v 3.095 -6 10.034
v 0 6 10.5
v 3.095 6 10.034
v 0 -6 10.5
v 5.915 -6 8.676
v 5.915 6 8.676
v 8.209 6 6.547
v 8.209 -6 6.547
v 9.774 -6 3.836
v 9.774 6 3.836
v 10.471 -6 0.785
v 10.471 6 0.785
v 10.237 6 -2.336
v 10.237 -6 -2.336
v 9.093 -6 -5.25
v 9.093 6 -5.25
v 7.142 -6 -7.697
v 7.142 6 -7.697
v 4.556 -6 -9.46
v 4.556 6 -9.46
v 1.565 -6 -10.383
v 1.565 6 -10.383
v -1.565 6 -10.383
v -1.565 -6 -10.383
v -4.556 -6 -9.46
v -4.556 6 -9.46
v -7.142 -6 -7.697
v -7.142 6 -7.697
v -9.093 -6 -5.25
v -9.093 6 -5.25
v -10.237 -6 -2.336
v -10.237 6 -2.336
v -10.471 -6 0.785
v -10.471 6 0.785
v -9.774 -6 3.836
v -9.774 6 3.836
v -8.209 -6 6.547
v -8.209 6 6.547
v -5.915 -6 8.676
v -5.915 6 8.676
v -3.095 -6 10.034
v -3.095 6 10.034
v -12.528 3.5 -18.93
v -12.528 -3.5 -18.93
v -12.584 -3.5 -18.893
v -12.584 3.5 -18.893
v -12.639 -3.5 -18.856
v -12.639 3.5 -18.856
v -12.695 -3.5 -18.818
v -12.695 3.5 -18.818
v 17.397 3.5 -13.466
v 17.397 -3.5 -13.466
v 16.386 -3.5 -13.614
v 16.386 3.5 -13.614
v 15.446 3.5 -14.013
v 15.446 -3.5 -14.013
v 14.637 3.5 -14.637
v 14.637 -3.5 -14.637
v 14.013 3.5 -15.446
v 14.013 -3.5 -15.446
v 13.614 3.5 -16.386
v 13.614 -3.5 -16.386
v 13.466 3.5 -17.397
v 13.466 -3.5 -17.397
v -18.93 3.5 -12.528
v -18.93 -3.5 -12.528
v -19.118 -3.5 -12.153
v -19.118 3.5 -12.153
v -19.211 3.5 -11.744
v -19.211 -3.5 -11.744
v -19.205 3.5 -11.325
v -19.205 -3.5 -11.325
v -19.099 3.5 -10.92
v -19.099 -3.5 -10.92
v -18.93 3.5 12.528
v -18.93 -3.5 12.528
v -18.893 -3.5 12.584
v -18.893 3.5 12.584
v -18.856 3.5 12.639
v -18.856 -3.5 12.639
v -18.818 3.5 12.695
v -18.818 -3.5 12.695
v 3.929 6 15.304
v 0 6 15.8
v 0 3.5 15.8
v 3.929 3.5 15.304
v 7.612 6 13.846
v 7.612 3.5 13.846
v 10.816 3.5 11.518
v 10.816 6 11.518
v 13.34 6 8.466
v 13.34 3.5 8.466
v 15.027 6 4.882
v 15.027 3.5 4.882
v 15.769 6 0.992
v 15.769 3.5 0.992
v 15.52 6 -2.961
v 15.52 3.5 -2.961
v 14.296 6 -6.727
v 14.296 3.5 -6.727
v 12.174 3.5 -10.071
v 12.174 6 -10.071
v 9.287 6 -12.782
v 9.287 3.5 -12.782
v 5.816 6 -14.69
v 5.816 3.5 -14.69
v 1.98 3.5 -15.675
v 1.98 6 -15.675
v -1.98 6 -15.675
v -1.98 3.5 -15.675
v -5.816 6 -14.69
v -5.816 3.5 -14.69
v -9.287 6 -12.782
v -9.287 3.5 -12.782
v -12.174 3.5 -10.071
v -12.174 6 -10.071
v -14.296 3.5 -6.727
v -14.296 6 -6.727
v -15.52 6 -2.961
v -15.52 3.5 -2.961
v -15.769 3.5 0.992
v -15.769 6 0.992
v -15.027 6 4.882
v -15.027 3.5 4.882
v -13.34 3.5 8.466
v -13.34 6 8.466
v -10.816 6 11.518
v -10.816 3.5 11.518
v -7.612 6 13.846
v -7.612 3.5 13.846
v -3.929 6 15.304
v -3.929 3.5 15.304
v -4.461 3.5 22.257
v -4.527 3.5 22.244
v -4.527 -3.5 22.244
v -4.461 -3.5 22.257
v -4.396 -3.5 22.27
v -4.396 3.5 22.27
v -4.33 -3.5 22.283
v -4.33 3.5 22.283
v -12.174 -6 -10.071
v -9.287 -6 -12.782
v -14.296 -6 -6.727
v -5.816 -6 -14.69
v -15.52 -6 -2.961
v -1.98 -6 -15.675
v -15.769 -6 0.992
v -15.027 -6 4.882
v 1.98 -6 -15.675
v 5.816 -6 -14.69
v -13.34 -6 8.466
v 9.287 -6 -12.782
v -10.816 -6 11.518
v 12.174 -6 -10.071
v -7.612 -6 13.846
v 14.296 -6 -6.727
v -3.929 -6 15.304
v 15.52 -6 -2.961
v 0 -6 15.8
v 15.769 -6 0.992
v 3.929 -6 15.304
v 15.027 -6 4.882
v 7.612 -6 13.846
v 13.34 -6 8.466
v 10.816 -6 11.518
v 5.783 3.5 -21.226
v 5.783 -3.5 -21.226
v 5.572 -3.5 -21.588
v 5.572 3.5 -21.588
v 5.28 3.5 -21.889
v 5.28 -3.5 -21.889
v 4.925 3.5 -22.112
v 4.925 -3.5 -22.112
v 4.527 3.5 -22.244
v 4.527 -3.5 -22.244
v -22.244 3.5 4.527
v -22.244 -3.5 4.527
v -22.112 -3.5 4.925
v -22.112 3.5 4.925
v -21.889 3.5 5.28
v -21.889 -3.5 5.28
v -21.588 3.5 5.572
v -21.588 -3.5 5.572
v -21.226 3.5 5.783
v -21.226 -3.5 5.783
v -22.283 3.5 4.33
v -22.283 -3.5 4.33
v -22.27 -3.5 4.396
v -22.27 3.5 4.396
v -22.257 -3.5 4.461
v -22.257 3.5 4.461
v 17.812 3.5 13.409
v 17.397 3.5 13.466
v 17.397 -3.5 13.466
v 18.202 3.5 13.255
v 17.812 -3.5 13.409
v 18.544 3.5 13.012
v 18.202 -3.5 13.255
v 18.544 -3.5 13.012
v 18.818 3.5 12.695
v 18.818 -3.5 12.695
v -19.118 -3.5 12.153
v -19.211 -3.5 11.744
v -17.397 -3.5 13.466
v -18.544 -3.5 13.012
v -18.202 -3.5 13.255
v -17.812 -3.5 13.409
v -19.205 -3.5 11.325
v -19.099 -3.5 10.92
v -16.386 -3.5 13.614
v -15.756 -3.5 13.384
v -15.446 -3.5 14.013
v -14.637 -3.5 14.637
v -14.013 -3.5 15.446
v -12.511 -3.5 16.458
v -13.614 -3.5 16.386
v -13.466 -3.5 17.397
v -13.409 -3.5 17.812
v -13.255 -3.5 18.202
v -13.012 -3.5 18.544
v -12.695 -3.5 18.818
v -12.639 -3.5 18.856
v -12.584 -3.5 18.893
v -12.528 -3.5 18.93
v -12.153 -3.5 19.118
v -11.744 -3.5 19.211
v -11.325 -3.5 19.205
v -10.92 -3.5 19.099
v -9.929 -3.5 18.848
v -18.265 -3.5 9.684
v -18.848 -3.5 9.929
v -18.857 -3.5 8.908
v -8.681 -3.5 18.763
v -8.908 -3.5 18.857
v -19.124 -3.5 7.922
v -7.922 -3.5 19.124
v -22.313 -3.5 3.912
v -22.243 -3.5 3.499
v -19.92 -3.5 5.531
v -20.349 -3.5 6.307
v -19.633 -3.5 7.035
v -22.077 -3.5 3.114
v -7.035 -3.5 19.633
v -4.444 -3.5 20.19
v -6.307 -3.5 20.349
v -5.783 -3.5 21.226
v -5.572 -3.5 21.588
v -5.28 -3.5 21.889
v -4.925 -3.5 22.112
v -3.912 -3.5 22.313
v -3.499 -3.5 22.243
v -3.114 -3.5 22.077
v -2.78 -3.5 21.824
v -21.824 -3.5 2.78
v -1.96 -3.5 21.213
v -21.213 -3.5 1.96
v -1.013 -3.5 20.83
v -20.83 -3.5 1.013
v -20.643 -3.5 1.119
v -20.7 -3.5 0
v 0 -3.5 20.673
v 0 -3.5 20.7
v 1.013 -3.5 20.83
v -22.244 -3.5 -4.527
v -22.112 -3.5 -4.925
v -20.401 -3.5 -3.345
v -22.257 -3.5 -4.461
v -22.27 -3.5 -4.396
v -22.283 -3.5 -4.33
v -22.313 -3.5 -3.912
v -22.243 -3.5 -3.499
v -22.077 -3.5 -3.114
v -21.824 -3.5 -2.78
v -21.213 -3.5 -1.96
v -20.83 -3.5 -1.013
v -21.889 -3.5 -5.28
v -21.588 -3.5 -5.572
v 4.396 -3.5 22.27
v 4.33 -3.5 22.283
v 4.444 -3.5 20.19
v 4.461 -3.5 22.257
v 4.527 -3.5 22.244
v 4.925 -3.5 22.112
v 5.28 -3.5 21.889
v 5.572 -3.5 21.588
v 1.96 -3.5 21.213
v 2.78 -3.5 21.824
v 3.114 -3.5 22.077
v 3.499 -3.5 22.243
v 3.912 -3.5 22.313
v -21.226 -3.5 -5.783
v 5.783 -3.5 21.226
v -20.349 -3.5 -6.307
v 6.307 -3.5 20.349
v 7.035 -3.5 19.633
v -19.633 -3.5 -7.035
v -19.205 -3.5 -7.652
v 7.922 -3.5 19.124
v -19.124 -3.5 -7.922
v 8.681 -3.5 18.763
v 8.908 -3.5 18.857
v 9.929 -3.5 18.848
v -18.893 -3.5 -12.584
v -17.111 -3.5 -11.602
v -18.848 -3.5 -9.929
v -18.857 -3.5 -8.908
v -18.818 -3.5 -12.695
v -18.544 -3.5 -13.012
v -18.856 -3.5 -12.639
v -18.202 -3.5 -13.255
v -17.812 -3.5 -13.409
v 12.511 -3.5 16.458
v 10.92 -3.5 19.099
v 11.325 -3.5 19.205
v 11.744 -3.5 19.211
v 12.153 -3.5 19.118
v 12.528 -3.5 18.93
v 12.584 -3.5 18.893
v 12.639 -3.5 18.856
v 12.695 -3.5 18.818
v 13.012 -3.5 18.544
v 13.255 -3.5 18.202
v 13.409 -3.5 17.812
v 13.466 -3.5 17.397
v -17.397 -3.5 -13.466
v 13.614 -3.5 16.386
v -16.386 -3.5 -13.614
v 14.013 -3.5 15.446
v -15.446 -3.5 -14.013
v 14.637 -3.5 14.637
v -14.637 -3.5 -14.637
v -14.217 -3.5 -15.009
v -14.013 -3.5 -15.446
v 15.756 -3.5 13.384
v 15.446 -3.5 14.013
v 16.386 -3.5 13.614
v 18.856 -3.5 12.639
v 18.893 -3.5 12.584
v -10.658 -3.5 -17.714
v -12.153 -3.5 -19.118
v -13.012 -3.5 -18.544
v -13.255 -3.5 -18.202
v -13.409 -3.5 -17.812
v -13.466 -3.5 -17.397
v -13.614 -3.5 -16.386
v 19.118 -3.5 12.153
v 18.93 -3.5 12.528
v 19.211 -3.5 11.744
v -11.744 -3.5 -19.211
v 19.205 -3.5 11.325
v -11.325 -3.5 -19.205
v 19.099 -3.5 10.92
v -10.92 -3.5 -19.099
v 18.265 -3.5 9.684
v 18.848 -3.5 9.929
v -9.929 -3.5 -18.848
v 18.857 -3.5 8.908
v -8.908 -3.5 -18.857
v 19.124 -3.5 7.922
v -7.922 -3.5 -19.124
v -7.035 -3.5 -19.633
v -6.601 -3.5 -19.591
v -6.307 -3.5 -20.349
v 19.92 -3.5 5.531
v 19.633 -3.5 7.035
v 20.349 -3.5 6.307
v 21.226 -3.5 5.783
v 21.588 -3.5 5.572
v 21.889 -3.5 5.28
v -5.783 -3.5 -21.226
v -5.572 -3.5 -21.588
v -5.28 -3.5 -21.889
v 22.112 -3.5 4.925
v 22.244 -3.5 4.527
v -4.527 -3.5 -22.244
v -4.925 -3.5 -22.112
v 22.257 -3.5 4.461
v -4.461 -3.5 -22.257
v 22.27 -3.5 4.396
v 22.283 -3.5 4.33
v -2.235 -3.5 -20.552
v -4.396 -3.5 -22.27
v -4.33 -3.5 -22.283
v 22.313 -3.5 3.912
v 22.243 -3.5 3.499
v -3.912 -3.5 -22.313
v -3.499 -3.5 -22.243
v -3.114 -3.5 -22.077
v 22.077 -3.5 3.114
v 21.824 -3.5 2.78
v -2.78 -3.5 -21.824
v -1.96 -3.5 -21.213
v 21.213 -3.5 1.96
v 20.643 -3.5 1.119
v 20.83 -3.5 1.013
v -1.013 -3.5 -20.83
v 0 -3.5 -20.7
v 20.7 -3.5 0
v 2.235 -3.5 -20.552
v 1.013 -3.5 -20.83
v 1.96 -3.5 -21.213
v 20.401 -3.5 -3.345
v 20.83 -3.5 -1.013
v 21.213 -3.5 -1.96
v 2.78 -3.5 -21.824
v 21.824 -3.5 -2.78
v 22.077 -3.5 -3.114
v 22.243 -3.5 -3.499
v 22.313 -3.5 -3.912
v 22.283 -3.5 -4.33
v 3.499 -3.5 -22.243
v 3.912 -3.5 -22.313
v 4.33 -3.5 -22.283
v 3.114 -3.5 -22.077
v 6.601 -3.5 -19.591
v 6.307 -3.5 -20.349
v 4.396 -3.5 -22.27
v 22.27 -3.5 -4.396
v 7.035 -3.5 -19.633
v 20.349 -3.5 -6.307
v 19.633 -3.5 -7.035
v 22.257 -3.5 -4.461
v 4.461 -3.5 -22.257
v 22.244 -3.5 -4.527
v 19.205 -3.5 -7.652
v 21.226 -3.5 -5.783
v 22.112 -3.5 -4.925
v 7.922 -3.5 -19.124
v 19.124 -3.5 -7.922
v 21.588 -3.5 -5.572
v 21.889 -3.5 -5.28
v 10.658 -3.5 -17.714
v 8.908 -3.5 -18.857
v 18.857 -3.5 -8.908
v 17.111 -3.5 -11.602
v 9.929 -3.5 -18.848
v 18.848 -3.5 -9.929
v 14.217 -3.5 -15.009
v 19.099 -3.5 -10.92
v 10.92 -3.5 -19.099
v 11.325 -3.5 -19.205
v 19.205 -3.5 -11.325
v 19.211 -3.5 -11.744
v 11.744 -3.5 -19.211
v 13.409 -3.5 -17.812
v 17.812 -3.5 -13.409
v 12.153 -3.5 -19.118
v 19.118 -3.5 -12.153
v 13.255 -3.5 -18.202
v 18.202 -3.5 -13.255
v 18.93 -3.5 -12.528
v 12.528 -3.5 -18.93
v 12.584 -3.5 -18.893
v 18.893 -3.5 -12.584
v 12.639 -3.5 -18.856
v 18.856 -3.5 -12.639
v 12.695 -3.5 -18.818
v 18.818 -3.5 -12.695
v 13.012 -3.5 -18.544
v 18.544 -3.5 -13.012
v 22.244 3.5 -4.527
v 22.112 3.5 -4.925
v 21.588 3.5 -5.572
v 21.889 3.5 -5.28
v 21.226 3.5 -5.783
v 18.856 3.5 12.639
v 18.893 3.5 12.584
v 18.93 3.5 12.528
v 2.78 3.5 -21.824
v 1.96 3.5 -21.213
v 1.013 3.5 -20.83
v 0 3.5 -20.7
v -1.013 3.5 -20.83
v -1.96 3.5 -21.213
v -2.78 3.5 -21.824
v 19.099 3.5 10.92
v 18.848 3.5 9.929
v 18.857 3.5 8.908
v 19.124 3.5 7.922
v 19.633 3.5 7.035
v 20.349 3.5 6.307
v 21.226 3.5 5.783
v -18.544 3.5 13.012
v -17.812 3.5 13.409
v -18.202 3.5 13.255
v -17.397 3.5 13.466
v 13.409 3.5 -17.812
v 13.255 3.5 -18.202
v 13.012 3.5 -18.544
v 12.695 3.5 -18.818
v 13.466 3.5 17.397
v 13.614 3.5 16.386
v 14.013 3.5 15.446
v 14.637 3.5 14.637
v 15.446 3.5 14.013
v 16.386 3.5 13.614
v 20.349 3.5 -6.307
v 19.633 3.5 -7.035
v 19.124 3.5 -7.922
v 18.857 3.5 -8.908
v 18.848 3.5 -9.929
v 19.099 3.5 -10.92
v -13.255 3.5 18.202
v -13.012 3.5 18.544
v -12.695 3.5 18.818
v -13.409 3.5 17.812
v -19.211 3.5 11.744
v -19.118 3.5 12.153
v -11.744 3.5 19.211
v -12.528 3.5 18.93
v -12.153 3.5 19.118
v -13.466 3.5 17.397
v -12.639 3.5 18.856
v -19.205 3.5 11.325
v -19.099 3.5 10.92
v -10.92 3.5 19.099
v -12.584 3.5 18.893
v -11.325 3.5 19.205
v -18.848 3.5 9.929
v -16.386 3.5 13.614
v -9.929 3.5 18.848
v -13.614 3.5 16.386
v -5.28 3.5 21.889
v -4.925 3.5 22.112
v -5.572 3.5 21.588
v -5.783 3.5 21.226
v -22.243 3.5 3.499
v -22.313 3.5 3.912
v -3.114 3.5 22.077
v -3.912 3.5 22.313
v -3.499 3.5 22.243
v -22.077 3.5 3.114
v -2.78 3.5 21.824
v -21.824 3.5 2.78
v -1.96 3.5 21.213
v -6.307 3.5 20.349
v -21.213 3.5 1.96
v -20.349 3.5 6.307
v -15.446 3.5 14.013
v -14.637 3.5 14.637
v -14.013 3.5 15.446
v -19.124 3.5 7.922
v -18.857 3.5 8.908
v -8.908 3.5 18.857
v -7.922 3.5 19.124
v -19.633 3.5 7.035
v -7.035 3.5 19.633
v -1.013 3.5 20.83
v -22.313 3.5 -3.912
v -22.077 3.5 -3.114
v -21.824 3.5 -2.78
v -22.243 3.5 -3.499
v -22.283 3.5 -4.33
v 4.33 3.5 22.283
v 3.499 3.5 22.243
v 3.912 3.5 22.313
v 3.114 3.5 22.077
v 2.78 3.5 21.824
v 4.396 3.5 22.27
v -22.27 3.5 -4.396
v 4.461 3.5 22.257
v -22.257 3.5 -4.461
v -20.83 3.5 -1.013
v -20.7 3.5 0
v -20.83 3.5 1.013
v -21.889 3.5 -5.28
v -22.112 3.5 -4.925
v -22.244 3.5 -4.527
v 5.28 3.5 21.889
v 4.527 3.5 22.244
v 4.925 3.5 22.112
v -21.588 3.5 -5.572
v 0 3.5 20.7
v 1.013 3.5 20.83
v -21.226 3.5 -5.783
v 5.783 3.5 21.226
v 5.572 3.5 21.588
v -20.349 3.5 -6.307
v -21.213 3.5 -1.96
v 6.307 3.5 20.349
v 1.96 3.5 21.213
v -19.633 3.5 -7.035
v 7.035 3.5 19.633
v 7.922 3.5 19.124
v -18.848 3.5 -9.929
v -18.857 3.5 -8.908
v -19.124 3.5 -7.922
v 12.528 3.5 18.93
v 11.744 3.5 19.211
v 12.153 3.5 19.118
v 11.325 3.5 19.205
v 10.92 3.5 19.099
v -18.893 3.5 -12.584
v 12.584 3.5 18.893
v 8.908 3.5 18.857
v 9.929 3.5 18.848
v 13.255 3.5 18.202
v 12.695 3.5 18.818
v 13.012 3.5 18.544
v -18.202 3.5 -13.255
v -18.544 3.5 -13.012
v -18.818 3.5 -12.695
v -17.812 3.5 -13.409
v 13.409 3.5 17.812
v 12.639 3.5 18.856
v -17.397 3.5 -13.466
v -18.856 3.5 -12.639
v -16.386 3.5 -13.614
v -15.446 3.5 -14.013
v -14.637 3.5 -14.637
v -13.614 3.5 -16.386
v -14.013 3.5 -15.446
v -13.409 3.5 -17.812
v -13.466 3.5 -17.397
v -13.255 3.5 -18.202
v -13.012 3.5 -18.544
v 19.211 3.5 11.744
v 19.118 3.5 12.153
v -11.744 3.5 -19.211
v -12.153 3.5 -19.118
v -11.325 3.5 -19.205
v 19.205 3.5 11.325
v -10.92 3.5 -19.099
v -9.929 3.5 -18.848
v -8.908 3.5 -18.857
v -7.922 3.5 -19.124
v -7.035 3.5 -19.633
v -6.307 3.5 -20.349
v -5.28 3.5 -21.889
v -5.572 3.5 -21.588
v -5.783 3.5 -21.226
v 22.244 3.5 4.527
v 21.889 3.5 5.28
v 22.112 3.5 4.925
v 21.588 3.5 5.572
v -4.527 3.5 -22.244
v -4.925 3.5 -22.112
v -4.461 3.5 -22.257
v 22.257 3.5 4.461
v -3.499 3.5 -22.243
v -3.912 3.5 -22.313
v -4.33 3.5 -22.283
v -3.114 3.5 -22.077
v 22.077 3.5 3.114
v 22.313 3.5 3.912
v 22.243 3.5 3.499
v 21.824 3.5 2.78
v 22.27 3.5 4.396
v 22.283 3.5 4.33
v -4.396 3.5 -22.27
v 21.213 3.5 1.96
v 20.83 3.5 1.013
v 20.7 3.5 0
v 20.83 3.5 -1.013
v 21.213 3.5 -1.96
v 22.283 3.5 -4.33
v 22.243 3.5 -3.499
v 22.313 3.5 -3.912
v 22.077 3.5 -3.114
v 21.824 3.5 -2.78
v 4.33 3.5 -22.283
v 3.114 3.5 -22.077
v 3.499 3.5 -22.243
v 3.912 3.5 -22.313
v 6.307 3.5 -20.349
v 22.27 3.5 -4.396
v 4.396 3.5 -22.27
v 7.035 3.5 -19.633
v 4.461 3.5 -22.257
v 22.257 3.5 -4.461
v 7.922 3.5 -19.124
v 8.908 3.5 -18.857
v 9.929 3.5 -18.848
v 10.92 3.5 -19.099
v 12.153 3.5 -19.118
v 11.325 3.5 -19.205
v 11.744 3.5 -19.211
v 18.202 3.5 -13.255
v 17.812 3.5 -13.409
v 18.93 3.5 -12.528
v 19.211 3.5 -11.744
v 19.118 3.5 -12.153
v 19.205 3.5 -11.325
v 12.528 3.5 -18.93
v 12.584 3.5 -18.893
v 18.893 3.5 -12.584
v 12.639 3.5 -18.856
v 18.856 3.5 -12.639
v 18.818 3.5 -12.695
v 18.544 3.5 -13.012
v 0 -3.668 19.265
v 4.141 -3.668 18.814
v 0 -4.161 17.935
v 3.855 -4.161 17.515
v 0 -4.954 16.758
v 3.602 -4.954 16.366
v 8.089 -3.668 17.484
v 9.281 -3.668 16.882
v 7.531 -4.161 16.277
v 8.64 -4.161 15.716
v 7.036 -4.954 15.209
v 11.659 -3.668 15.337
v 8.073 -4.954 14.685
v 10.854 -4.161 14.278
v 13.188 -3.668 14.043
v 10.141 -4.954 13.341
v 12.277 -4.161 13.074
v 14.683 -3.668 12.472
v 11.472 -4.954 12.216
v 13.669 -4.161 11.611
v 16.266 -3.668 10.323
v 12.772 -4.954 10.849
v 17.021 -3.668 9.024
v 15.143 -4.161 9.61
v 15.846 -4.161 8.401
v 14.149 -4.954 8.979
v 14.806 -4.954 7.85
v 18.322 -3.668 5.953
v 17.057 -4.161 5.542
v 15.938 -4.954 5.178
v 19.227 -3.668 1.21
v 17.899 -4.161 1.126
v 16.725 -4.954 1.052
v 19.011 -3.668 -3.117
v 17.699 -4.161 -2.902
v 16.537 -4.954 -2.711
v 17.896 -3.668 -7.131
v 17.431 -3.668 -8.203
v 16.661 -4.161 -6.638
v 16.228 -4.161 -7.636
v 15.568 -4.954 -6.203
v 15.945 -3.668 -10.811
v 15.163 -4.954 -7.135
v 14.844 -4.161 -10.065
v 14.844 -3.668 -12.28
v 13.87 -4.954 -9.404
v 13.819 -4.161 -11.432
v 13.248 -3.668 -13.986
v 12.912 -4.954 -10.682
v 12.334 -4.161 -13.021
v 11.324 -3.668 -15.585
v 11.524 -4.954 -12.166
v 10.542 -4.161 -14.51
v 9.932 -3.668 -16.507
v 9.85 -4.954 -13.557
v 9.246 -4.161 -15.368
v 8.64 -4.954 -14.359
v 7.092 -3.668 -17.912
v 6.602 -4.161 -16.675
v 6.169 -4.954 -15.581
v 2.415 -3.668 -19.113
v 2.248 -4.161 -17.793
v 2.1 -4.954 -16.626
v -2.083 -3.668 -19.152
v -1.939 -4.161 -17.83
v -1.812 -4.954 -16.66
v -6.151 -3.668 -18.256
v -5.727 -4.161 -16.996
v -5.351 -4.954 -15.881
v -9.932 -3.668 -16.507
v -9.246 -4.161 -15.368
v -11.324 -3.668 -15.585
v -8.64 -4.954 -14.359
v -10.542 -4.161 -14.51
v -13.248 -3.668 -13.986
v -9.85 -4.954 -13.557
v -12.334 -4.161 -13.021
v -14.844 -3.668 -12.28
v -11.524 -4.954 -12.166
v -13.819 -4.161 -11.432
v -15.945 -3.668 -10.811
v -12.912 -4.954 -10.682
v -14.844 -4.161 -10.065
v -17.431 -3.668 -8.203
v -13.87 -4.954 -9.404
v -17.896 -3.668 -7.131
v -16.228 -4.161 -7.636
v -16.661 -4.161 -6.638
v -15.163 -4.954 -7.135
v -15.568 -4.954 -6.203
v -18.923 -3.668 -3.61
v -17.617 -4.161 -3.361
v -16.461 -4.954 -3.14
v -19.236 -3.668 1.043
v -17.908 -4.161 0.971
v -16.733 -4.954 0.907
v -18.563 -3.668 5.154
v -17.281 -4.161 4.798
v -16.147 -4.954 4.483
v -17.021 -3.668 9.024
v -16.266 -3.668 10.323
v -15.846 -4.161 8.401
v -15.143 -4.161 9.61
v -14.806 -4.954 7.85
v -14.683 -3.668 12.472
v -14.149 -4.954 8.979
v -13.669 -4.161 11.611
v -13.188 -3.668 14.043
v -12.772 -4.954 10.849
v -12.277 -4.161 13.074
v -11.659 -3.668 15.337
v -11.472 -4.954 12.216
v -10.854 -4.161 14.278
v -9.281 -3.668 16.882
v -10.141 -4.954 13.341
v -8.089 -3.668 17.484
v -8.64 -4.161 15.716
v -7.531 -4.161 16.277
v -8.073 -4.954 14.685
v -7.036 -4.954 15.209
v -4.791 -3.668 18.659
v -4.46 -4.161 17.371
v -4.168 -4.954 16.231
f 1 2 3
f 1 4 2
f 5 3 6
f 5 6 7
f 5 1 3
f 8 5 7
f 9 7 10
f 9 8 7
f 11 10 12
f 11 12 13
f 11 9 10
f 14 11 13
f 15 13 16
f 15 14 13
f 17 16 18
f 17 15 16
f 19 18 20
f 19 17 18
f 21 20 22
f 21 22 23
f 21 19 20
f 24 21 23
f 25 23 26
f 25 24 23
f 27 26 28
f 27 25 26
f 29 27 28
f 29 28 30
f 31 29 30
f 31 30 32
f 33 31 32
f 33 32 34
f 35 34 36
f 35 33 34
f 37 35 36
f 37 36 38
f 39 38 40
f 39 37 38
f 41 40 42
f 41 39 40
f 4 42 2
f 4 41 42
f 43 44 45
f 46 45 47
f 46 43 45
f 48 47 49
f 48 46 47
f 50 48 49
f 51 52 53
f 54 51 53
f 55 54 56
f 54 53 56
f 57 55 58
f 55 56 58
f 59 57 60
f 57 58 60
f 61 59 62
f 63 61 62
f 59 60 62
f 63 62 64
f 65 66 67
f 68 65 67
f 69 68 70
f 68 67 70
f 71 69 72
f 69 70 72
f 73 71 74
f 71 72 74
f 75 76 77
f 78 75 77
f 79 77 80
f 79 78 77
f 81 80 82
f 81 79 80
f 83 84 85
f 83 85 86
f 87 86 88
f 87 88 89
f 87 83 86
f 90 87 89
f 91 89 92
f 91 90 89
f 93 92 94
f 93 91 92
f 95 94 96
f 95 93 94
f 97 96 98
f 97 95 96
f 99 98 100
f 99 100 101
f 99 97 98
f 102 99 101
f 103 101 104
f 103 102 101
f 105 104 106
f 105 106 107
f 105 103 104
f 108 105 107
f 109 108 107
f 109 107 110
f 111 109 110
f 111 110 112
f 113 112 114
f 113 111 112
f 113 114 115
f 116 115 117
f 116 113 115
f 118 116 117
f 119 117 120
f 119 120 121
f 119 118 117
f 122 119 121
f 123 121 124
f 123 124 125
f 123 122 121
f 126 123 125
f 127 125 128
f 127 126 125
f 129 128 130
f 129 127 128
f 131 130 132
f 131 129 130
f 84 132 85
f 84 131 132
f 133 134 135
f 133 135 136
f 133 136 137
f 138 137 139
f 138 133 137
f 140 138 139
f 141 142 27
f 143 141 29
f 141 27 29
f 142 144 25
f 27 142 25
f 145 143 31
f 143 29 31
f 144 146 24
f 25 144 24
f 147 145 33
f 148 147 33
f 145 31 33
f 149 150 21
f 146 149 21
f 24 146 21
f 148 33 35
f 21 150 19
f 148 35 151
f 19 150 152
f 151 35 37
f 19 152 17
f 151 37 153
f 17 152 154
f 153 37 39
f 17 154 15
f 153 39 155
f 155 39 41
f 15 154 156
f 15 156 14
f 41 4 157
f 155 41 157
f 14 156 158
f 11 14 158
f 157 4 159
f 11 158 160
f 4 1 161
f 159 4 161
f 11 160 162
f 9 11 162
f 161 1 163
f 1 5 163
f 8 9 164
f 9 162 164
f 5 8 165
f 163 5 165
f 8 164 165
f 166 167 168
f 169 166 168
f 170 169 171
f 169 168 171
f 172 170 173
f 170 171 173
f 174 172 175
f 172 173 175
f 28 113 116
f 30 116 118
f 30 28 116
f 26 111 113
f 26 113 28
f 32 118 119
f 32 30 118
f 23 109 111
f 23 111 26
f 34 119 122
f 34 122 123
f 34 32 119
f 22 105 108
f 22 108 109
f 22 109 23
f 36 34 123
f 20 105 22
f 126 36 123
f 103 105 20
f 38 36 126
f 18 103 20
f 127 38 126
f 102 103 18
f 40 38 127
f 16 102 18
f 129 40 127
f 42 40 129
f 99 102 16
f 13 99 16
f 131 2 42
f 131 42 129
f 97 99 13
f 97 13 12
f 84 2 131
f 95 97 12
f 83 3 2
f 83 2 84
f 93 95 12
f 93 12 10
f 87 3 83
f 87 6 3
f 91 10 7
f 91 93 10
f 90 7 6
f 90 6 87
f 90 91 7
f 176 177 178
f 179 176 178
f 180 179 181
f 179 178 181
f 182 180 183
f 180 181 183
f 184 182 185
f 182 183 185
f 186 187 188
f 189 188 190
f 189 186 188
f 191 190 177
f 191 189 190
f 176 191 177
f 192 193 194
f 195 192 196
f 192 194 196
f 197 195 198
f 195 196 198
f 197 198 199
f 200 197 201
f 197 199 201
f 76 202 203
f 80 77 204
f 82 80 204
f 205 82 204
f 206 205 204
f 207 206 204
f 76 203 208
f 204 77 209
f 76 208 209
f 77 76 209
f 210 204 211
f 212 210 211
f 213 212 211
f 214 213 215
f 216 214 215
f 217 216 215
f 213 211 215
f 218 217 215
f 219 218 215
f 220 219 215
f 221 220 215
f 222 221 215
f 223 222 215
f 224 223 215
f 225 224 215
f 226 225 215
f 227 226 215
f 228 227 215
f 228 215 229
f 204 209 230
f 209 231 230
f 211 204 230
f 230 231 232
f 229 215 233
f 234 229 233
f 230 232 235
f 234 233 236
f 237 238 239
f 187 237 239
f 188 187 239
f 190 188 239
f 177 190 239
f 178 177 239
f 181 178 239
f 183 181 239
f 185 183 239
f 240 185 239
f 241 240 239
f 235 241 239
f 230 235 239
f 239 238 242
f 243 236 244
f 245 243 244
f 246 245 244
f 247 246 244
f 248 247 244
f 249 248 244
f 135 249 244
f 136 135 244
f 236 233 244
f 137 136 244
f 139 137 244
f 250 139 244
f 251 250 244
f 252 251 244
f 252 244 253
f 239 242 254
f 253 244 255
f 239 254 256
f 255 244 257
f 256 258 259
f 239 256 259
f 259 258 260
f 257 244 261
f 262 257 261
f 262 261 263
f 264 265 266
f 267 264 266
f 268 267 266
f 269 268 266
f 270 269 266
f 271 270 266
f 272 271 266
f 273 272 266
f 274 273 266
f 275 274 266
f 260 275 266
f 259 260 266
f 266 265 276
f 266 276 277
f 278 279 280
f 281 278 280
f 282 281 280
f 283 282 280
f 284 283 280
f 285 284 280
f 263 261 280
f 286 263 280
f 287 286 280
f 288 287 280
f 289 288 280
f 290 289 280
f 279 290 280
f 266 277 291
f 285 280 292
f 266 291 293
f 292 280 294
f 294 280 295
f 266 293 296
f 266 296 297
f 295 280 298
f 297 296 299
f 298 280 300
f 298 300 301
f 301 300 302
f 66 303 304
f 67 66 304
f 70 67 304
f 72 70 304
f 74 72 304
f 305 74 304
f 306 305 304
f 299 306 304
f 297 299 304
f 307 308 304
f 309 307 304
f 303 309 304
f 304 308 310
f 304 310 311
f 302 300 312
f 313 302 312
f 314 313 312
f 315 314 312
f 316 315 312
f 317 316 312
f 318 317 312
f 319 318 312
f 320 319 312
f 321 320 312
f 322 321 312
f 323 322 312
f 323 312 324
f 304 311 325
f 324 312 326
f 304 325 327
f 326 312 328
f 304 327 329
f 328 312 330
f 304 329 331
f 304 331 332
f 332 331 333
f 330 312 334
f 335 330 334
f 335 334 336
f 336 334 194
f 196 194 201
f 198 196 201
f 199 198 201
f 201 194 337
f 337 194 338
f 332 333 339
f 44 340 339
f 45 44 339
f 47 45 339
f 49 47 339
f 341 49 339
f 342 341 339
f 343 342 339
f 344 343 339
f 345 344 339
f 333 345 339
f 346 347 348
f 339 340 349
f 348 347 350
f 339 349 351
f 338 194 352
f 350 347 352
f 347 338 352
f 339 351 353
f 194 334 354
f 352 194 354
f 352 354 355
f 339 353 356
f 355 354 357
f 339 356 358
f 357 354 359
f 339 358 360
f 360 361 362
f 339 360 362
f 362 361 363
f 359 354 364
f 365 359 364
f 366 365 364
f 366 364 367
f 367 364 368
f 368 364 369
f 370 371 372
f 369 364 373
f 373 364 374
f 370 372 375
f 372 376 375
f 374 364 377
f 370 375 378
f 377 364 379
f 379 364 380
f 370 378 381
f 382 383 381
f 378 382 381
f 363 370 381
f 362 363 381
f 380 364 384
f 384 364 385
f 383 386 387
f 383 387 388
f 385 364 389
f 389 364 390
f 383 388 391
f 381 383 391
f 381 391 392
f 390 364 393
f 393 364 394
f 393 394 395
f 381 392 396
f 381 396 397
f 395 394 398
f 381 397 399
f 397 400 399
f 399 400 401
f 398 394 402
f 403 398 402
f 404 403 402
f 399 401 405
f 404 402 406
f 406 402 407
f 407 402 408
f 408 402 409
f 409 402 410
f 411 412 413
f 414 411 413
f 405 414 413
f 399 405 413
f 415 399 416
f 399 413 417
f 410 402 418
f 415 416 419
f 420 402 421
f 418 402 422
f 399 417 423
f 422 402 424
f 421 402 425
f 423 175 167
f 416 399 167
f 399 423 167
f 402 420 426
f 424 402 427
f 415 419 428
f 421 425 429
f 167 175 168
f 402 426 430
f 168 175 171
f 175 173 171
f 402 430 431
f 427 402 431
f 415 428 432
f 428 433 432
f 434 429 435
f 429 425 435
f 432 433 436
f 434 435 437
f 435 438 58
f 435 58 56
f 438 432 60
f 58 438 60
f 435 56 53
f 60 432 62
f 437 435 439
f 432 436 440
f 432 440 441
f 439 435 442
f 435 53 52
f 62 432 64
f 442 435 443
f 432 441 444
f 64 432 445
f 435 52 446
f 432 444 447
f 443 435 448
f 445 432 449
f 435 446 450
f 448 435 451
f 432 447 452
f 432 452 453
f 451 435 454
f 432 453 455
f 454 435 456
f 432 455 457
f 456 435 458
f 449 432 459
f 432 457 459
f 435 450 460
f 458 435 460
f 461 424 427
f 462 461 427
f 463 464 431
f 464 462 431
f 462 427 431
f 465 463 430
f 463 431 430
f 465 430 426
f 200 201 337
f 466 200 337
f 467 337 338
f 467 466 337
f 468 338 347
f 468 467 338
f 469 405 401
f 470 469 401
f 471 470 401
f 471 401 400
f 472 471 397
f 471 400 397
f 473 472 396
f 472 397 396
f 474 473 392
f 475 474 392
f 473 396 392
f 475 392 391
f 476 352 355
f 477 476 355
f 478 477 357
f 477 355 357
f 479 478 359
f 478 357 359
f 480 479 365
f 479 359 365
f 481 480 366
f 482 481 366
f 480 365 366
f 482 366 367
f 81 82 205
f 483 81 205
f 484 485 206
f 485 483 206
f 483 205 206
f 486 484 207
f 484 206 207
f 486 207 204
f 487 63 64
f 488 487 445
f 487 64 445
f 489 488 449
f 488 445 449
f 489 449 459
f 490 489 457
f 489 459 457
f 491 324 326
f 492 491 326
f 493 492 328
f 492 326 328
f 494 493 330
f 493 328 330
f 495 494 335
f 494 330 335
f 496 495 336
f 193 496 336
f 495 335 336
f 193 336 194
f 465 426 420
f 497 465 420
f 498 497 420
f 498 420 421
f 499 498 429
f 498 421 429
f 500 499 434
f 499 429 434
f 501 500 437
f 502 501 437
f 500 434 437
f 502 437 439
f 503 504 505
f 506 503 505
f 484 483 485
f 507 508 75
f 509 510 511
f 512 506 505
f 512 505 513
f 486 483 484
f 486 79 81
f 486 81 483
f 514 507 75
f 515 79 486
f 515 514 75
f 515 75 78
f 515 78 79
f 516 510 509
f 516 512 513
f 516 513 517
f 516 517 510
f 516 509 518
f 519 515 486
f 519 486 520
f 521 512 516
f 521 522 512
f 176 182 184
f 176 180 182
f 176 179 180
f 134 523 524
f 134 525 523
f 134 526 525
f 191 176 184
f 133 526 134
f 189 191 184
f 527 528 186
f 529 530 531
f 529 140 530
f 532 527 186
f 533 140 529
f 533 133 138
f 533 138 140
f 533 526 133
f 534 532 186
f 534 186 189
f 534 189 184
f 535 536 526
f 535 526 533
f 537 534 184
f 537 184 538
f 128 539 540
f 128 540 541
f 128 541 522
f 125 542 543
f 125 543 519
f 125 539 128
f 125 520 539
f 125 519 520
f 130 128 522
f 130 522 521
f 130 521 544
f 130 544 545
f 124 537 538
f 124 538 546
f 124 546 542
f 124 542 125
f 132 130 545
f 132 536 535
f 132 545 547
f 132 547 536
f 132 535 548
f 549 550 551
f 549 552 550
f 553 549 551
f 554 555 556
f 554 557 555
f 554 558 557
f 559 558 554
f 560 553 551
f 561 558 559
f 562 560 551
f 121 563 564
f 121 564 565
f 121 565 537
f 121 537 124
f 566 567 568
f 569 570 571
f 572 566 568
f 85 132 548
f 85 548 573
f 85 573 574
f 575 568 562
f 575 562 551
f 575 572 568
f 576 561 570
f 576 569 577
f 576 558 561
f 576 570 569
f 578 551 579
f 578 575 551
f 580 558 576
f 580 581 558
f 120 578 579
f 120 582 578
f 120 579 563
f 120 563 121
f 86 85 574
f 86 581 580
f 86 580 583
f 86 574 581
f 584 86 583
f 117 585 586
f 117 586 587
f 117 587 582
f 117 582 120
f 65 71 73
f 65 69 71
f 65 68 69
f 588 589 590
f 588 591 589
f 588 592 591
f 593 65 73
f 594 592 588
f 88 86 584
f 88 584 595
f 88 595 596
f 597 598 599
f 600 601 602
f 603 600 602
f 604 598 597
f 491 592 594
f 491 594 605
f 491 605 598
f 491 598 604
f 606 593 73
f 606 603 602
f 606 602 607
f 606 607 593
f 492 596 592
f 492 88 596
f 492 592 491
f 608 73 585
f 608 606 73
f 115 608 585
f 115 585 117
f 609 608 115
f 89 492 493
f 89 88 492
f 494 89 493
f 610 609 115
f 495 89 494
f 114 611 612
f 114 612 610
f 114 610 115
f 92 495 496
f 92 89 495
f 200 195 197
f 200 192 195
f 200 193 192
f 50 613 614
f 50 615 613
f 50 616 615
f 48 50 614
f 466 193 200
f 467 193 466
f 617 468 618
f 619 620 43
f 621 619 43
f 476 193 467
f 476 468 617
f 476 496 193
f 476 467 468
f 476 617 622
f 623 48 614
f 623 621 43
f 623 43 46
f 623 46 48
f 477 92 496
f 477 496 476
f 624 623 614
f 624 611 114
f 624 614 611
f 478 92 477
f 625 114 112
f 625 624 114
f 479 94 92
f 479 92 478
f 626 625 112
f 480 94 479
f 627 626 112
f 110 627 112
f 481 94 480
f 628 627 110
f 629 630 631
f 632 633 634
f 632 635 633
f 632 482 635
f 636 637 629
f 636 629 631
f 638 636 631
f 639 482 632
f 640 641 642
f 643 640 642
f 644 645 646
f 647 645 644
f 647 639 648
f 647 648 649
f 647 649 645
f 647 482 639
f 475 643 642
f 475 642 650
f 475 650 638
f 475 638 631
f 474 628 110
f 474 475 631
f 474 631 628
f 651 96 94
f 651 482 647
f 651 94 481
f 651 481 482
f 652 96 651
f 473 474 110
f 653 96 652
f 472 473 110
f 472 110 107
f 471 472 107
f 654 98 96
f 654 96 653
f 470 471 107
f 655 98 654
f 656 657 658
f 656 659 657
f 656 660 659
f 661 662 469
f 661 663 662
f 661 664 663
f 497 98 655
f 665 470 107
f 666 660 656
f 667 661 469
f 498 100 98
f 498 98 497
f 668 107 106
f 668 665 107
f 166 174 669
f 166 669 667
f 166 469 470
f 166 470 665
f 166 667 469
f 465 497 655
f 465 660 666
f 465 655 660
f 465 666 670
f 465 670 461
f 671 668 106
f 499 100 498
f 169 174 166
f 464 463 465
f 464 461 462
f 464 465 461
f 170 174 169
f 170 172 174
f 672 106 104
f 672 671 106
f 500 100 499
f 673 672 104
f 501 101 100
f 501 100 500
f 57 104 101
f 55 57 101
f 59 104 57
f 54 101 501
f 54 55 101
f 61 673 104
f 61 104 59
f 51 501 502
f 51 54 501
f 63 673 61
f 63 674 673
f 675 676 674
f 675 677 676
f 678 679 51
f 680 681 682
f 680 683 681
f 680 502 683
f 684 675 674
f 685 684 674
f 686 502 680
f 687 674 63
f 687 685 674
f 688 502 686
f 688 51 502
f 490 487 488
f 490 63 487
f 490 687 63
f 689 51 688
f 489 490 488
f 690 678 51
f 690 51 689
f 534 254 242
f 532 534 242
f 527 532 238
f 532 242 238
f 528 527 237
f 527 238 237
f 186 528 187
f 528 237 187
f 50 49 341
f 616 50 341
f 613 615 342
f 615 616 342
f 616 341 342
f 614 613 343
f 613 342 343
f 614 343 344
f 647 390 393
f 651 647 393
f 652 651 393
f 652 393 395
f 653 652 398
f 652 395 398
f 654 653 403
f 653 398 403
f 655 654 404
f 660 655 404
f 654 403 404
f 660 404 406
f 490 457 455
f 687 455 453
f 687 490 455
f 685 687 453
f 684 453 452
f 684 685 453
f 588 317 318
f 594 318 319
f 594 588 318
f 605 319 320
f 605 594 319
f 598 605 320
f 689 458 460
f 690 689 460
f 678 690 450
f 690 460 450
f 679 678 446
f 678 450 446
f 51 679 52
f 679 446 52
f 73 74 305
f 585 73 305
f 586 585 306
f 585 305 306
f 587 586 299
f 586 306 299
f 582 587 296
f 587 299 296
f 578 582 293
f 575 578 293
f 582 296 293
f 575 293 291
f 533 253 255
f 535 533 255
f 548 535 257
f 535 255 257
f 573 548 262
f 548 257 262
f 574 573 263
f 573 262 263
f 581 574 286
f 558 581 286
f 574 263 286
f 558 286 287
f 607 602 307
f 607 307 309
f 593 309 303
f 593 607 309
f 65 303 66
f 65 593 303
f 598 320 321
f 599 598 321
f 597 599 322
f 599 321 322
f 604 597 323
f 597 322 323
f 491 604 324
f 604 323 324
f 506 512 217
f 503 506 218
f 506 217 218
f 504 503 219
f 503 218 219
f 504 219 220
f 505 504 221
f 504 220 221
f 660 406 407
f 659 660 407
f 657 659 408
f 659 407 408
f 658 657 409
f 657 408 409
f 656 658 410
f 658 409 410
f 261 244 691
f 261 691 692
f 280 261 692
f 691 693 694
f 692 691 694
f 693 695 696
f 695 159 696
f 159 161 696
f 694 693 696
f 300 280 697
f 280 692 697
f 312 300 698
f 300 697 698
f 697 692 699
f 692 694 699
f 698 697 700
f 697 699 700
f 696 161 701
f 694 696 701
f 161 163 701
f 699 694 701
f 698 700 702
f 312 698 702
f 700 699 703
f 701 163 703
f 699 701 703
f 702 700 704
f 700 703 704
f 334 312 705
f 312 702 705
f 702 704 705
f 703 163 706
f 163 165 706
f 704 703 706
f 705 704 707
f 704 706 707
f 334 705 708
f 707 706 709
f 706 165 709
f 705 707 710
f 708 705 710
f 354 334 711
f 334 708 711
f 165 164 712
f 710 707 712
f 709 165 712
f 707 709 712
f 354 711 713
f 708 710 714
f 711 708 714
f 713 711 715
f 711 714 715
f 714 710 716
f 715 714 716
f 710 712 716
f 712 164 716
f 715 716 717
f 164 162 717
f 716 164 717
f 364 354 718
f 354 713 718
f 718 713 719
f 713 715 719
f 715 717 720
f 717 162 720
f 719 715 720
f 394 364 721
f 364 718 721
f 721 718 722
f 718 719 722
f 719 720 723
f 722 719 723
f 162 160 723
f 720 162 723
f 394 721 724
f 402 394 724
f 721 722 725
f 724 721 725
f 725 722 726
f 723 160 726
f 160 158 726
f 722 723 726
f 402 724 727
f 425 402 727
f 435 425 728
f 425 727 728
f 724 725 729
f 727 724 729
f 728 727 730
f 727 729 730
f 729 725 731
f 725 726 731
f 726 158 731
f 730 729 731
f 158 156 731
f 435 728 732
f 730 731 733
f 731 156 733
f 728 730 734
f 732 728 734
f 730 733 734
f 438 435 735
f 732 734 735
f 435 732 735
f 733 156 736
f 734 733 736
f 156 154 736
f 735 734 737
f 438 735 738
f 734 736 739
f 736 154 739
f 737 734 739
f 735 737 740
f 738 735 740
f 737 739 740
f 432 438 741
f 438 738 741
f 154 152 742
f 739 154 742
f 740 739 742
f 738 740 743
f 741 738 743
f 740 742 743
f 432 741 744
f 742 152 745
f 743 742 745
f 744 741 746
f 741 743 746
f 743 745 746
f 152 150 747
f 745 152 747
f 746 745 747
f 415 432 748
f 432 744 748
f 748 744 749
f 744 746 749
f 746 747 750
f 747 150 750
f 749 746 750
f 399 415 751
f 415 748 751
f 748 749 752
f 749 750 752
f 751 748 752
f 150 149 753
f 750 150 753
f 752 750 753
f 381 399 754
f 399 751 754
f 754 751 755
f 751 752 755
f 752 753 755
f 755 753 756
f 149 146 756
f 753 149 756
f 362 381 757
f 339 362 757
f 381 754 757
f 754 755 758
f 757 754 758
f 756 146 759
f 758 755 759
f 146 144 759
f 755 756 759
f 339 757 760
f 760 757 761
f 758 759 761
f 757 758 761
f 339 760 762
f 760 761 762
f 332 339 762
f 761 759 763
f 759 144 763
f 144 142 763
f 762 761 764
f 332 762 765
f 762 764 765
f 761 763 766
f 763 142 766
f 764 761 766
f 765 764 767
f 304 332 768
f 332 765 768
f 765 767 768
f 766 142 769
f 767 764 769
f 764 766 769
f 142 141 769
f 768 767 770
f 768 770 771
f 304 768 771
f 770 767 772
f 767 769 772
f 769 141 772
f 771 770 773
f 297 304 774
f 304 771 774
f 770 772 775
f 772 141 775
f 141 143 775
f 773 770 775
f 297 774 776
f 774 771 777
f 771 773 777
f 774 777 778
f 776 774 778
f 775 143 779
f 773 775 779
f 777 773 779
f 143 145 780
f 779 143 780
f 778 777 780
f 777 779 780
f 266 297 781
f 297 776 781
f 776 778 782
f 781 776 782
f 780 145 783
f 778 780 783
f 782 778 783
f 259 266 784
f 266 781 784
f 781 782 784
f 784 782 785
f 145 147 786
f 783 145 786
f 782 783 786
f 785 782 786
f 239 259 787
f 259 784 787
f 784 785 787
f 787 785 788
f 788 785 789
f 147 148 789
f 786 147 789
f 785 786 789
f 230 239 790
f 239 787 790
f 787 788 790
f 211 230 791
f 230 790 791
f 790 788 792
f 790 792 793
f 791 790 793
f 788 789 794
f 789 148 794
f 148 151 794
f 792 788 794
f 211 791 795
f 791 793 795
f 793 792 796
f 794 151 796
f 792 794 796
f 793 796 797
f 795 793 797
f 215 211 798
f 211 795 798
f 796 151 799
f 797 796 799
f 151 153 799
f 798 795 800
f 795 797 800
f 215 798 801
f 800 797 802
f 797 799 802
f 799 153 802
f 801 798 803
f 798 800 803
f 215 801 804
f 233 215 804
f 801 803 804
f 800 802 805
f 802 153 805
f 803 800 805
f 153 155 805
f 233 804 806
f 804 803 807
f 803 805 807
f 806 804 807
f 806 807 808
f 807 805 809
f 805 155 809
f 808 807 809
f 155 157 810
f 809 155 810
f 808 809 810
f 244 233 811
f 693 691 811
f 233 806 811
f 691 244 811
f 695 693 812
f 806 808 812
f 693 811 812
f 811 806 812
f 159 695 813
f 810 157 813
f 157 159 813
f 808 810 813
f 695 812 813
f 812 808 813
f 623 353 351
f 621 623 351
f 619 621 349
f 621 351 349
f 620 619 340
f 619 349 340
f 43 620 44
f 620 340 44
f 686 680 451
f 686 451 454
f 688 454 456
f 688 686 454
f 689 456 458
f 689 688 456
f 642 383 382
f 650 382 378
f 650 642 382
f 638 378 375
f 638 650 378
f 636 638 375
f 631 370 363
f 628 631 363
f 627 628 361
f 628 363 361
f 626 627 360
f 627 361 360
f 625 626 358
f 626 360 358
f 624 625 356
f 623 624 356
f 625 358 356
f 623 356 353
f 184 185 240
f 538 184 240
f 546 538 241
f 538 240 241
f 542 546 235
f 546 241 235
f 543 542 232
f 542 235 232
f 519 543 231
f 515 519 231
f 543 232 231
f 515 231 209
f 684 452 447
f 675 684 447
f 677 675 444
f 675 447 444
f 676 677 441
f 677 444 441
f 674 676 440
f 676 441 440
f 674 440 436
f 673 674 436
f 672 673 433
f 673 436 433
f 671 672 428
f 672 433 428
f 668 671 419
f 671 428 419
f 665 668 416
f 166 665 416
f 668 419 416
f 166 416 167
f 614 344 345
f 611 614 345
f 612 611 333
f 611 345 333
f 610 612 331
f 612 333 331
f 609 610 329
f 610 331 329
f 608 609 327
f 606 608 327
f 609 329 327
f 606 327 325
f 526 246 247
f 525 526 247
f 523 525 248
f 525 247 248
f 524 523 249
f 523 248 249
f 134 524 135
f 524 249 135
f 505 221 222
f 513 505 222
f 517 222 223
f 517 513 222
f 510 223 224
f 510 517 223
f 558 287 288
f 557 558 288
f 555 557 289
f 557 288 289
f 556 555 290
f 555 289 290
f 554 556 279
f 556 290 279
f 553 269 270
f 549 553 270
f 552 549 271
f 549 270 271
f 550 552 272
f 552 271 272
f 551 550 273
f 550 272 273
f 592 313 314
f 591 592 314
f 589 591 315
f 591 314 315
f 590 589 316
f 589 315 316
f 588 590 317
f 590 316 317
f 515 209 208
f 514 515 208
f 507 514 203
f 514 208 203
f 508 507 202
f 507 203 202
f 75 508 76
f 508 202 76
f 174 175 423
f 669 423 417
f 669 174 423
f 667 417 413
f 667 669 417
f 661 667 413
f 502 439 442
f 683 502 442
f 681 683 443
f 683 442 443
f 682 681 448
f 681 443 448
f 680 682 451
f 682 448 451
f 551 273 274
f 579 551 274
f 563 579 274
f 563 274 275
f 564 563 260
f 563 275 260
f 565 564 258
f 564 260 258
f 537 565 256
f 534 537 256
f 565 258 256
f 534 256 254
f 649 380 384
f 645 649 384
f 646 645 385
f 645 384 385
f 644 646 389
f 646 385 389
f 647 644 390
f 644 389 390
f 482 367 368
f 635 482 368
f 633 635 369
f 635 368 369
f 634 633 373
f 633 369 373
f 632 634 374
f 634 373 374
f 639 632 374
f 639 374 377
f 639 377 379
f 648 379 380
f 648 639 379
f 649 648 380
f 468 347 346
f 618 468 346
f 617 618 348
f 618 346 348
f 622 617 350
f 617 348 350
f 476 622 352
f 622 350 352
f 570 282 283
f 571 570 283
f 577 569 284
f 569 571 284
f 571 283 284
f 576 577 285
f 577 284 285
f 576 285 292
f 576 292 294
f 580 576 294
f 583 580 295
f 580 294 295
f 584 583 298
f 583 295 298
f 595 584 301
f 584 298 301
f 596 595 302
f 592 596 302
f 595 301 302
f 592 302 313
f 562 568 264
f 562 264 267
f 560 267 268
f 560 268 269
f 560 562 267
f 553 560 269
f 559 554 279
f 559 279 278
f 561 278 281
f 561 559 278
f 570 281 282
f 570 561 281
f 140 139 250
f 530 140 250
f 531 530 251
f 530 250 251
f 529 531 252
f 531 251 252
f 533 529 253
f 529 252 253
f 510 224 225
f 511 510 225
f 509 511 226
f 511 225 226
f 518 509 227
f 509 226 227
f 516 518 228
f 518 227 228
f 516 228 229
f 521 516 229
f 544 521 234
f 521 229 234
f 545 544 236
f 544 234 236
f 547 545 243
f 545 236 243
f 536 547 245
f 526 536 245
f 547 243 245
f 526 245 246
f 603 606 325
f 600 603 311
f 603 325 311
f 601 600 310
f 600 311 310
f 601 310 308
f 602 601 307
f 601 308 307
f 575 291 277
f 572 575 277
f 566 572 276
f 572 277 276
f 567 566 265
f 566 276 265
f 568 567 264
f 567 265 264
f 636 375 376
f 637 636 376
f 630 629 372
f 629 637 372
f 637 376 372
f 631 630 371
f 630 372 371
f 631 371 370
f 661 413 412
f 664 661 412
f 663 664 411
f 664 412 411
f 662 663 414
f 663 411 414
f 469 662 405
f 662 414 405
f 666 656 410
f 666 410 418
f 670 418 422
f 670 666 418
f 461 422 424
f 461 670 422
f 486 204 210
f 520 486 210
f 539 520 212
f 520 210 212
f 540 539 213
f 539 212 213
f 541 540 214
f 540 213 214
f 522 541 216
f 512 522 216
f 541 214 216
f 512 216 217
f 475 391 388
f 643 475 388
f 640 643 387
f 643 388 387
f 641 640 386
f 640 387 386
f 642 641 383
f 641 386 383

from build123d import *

# Parameters (mm, degrees)
SKETCH1_R           = 22.7
SKETCH1_R_2         = 10.5
BOSS_EXTRUDE1_DEPTH = 6
SKETCH2_OUTSIDE_W   = 60.464
SKETCH2_OUTSIDE_H   = 60.464
SKETCH2_OUTSIDE_R   = 15.8
CUT_EXTRUDE1_DEPTH  = 2.5
FILLET1_R           = 6
CUT_EXTRUDE2_DEPTH  = 34.478799262
CIRPATTERN1_COUNT   = 16


with BuildPart() as part:
    # Sketch1 → Boss-Extrude1 (new, symmetric)
    with BuildSketch(Plane(origin=(0, 0, 0), x_dir=(1, 0, 0), z_dir=(0, 1, 0))):
        with Locations(Location((0, 0, 0), (0, 0, 270))):
            Circle(SKETCH1_R)
        with Locations(Location((0, 0, 0), (0, 0, 270))):
            Circle(SKETCH1_R_2, mode=Mode.SUBTRACT)
    extrude(amount=BOSS_EXTRUDE1_DEPTH, both=True)

    # Sketch2 outside → Cut-Extrude1 (cut)
    with BuildSketch(Plane(origin=(0, 6, 0), x_dir=(1, 0, 0), z_dir=(0, 1, 0))):
        Rectangle(SKETCH2_OUTSIDE_W, SKETCH2_OUTSIDE_H)
        with Locations(Location((0, 0, 0), (0, 0, 270))):
            Circle(SKETCH2_OUTSIDE_R, mode=Mode.SUBTRACT)
    cut_extrude1 = extrude(amount=-CUT_EXTRUDE1_DEPTH, mode=Mode.SUBTRACT)

    # Mirror1: Cut-Extrude1 across plane
    add(cut_extrude1.mirror(Plane.ZX), mode=Mode.SUBTRACT)

    # Fillet1
    # the kernel refuses this fillet: 6 mm, written as the material it adds along each edge
    with BuildSketch(Plane(origin=(0, -3.5, 0), x_dir=(0, 0, 1), z_dir=(-1, 0, 0))) as fillet1_piece_1:
        with BuildLine():
            CenterArc((20.673397172, -6), FILLET1_R, 90, 54.314665287)
            Line((15.8, -2.5), (15.702532057, -2.43))
            ThreePointArc((15.702532057, -2.43), (15.68, -1.25), (15.68, 0))
            Line((15.68, 0), (15.8, 0.12))
            Line((15.8, 0.12), (20.673397172, 0.12))
            Line((20.673397172, 0.12), (20.673397172, 0))
        make_face()
    revolve(axis=Axis((0, -3.5, 0), (0, 1, 0)))

    # Sketch3 → Cut-Extrude2 (cut, through all)
    with BuildSketch(Plane.XZ.offset(3.5)):
        with BuildLine():
            ThreePointArc((-2.779777309, 21.823745819), (0, 20.7), (2.779777309, 21.823745819))
            ThreePointArc((2.779777309, 21.823745819), (3.498507516, 22.243201944), (4.329718774, 22.283256839))
            ThreePointArc((4.329718774, 22.283256839), (0, 22.7), (-4.329718774, 22.283256839))
            ThreePointArc((-4.329718774, 22.283256839), (-3.498507516, 22.243201944), (-2.779777309, 21.823745819))
        make_face()
    cut_extrude2 = extrude(amount=-CUT_EXTRUDE2_DEPTH, mode=Mode.SUBTRACT)

    # CirPattern1: Cut-Extrude2 ×16 about axis
    cirpattern1_axis = Axis((0, 0, 0), (0, 1, 0))
    for i in range(1, CIRPATTERN1_COUNT):
        add(cut_extrude2.rotate(cirpattern1_axis, i * 360 / CIRPATTERN1_COUNT), mode=Mode.SUBTRACT)


solid = part.part
